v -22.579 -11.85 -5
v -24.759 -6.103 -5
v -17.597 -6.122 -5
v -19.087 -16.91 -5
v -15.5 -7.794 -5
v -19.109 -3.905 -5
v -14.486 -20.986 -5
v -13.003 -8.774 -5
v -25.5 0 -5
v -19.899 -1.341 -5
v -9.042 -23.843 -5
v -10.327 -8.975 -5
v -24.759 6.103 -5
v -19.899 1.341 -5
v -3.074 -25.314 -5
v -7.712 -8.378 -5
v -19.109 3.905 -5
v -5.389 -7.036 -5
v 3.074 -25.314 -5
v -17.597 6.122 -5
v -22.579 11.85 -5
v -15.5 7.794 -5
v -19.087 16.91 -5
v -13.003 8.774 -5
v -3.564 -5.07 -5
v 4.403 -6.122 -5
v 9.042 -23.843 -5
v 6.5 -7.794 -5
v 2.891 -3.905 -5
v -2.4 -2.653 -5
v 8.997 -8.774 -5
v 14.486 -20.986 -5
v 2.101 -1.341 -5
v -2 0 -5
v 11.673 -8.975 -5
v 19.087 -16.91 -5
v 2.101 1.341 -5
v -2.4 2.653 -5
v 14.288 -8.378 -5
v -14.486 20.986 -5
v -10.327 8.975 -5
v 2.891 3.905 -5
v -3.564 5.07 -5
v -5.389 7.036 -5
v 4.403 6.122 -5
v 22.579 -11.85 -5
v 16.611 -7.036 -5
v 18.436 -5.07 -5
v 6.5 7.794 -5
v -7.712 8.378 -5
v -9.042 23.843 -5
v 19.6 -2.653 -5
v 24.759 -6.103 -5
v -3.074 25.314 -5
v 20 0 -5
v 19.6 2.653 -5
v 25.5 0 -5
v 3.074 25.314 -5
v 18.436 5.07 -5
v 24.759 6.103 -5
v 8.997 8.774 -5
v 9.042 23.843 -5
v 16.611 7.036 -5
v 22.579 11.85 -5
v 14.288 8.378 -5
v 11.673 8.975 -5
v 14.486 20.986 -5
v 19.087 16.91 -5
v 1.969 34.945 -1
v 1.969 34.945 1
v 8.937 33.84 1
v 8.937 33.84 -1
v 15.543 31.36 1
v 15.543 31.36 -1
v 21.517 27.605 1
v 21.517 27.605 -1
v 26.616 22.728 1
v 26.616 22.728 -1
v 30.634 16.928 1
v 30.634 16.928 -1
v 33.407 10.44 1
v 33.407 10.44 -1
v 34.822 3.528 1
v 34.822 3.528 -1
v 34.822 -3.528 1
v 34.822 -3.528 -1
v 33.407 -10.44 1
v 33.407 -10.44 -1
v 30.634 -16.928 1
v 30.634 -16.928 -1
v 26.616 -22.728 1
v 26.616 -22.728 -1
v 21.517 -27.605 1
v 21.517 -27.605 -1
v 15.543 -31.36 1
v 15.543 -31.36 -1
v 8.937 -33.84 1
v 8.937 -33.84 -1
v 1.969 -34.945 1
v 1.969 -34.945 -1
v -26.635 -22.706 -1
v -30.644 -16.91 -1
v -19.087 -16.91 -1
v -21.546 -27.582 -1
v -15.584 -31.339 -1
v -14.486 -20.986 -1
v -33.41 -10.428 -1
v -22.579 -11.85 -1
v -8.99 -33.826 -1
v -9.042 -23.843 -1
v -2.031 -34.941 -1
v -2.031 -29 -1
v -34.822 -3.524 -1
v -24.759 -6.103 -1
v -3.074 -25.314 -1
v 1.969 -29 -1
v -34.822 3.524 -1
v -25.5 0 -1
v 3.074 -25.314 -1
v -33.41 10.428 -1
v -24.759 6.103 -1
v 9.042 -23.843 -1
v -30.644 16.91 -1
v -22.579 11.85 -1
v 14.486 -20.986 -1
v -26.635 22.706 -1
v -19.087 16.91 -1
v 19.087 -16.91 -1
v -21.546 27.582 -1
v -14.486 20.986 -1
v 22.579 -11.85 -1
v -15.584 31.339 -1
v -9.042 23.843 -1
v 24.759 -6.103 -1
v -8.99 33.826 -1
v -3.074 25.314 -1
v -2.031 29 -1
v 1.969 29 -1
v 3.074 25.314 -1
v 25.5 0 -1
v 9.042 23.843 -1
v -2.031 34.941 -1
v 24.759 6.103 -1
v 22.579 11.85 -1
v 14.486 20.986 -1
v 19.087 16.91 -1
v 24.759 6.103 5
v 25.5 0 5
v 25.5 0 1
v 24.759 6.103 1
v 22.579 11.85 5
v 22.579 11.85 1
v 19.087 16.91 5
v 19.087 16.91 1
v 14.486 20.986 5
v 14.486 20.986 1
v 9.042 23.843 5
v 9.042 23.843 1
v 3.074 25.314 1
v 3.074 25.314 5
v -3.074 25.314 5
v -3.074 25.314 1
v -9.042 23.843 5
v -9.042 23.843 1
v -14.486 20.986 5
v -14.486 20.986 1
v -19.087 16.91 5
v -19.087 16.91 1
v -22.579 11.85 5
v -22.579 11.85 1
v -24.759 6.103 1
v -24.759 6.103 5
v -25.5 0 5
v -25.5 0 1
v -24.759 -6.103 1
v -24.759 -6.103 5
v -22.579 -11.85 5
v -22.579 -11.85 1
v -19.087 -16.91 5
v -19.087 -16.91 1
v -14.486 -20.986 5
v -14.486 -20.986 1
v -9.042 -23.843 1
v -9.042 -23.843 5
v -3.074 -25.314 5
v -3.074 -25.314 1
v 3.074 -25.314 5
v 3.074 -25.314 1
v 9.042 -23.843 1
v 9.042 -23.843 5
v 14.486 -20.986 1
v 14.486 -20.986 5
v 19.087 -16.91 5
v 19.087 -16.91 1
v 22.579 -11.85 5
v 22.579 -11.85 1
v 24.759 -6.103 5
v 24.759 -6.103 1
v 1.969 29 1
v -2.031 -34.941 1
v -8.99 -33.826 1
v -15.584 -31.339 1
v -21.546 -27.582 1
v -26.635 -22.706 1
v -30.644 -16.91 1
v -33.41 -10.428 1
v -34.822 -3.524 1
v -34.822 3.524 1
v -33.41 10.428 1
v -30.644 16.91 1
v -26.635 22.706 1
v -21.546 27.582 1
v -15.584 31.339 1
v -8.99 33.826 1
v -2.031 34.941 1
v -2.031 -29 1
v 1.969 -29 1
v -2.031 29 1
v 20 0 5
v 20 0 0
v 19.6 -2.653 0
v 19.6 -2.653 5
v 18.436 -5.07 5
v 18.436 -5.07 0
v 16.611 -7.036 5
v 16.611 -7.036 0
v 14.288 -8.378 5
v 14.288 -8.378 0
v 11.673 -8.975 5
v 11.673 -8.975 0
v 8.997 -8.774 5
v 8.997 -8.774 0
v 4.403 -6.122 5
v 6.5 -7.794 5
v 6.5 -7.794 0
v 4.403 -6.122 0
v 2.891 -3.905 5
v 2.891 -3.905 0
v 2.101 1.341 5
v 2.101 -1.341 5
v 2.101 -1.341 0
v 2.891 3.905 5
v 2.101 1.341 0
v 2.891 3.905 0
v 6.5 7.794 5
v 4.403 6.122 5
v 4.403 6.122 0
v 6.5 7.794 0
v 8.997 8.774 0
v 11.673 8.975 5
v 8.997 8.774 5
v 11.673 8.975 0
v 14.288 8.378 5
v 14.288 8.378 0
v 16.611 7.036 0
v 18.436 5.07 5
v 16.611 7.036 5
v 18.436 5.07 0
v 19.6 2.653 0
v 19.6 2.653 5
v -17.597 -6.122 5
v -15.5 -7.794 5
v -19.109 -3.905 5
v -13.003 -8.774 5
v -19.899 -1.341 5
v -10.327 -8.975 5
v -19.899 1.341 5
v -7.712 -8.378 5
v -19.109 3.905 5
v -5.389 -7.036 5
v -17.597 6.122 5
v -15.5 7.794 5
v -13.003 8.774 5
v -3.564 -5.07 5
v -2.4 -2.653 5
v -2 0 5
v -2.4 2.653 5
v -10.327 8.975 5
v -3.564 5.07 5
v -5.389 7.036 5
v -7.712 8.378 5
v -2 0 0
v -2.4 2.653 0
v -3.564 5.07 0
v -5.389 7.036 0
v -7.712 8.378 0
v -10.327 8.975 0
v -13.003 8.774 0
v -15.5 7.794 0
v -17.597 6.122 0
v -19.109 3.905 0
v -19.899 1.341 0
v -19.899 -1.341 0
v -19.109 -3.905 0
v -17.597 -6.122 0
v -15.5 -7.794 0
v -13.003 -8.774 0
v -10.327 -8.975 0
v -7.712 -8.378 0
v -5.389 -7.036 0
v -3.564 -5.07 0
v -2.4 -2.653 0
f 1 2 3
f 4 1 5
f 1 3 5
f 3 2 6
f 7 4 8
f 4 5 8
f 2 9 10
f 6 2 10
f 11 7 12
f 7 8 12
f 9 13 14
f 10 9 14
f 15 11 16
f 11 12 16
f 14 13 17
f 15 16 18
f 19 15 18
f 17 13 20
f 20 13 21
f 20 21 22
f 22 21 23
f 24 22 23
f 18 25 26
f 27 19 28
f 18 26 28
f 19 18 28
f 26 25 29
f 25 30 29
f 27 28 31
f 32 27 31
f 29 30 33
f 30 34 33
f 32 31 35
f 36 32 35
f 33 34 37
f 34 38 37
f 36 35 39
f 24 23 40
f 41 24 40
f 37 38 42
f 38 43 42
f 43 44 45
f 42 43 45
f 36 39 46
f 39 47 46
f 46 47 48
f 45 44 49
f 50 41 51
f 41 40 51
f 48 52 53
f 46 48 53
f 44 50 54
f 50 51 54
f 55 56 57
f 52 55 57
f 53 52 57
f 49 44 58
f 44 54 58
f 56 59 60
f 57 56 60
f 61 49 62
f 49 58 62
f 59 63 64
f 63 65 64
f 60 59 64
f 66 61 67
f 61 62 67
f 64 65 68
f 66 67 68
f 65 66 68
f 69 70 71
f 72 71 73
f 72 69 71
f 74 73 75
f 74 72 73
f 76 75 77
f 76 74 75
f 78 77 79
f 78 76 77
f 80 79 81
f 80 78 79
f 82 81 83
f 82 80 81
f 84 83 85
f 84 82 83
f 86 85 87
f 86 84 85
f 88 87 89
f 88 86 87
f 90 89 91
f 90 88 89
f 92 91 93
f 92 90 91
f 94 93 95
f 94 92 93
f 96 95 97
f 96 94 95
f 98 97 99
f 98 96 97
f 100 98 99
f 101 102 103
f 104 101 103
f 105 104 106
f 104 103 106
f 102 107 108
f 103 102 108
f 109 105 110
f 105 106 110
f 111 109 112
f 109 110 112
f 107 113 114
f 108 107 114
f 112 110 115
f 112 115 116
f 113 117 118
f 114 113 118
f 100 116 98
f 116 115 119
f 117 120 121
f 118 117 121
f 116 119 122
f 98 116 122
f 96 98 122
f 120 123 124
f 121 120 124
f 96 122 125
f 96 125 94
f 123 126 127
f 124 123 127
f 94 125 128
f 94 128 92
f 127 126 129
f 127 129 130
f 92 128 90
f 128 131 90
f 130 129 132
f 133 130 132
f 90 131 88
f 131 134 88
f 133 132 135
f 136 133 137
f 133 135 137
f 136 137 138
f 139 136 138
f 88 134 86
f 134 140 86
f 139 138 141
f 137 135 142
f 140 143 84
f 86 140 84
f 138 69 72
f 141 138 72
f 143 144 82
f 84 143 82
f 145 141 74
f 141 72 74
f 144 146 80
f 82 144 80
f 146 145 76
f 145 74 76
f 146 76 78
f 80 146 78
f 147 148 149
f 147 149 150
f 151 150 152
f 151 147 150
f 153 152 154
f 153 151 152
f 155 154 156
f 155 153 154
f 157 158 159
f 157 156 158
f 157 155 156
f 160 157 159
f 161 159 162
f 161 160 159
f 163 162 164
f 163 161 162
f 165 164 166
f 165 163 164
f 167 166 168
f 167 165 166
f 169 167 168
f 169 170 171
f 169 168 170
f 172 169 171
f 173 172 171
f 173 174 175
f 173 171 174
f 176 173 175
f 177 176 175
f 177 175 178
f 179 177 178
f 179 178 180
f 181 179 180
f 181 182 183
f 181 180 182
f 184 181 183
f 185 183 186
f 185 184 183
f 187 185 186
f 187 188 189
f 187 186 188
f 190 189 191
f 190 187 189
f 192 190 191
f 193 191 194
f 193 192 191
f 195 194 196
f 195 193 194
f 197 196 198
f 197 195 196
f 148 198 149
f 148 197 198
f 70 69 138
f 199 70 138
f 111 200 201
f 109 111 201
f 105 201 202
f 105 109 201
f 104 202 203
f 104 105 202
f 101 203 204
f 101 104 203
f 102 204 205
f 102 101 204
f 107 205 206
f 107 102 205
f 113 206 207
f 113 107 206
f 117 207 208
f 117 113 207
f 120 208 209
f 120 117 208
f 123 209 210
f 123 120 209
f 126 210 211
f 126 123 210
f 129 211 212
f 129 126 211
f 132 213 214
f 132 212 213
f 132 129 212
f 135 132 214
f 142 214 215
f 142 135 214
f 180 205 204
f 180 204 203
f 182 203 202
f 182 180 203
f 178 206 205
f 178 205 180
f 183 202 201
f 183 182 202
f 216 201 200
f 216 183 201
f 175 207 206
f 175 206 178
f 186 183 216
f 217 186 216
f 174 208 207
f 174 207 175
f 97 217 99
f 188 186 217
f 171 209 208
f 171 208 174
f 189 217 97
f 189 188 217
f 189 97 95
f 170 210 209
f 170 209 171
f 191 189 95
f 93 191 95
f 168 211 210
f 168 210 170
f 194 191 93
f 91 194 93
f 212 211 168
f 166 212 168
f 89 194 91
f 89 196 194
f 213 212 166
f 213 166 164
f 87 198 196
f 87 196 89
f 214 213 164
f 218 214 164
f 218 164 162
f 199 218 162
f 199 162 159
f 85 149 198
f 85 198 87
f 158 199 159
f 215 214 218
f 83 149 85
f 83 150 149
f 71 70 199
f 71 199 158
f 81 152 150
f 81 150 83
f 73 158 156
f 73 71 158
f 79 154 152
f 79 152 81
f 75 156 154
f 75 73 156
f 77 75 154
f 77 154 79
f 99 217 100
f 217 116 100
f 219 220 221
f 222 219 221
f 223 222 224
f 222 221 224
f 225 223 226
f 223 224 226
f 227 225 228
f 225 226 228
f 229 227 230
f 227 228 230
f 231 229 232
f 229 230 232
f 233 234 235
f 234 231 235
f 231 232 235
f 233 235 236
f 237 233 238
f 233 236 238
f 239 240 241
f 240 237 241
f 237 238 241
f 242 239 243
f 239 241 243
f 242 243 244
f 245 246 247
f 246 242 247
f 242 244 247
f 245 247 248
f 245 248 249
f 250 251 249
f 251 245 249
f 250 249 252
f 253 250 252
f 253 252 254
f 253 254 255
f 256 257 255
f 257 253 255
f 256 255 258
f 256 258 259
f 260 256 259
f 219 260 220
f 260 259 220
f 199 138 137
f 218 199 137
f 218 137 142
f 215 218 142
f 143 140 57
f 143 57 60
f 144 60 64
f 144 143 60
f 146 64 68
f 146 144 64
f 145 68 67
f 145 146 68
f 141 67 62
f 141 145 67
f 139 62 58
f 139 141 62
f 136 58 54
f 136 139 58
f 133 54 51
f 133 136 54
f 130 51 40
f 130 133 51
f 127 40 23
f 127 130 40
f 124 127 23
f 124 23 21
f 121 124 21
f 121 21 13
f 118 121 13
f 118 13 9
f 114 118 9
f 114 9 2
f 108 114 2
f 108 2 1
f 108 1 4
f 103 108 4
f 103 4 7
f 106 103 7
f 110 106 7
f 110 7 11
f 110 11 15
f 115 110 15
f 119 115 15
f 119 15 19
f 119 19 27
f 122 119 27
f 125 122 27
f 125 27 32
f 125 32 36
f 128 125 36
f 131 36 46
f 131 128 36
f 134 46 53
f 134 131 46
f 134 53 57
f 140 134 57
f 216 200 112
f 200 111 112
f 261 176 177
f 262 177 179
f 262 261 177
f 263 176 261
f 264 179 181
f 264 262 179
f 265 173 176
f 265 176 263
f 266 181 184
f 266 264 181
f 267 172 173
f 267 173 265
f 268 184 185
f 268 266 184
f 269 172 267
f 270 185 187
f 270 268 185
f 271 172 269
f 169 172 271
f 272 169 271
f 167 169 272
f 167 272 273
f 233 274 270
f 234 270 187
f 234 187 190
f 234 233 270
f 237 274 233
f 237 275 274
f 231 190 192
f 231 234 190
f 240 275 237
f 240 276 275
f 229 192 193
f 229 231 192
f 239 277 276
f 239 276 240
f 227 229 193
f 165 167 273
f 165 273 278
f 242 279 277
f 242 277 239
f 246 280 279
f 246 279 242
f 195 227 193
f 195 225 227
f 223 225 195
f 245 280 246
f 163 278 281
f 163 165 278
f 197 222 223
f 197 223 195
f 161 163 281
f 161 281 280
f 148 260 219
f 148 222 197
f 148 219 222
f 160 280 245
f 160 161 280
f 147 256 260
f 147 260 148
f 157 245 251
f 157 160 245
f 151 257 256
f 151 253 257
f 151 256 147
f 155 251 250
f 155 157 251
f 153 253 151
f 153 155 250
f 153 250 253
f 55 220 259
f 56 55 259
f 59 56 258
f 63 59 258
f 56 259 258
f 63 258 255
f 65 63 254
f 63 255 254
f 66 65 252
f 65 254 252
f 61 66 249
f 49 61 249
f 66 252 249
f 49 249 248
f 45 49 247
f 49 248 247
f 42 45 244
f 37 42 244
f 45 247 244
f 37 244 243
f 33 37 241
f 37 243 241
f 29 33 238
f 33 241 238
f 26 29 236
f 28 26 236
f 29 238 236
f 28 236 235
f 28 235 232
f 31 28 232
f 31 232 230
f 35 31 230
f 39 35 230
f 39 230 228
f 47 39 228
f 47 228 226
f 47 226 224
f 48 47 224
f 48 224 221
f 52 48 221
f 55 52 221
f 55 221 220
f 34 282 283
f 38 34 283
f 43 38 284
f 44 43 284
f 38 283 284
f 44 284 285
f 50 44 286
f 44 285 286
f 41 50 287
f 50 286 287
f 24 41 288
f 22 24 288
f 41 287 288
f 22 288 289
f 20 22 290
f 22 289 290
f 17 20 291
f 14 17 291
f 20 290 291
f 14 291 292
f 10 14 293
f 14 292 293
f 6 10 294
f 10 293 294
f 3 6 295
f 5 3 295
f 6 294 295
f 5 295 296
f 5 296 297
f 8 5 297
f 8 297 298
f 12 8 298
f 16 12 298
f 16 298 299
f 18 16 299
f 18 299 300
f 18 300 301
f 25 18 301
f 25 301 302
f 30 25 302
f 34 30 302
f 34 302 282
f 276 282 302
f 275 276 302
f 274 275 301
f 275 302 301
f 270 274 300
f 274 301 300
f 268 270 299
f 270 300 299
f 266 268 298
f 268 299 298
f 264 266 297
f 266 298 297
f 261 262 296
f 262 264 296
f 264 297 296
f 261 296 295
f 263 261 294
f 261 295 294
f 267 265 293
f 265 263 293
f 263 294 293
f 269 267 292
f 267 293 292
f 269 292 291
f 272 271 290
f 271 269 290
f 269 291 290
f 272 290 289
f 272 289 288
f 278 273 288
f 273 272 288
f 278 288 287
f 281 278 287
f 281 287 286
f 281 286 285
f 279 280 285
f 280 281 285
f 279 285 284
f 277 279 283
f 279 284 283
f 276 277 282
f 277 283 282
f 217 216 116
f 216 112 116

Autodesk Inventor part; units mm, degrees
ref_plane "YZ Plane" through (0, 0, 0) normal (1, 0, 0) x (0, 1, 0)
ref_plane "XZ Plane" through (0, 0, 0) normal (0, 1, 0) x (-1, 0, 0)
ref_plane "XY Plane" through (0, 0, 0) normal (0, 0, 1) x (1, 0, 0)
sketch "Эскиз1" plane through (0, 0, 0) normal (0, 0, 1) x (1, 0, 0)
  circle A0 centre (0, 0) radius 35
  circle A1 centre (0, 0) radius 25.5
  circle A2 centre (11, 0) radius 9
  circle A3 centre (-11, 0) radius 9
  line L0 (-2.0313, 35) -> (1.9687, 35)
  line L1 (1.9687, 35) -> (1.9687, 29)
  line L2 (1.9687, 29) -> (-2.0313, 29)
  line L3 (-2.0313, 29) -> (-2.0313, 35)
  line L4 (-2.0313, -29) -> (1.9687, -29)
  line L5 (1.9687, -29) -> (1.9687, -35)
  line L6 (1.9687, -35) -> (-2.0313, -35)
  line L7 (-2.0313, -35) -> (-2.0313, -29)
  line L8 (-0.0313, 25.5) -> (-0.0313, -25.5)
  line L9 (-0.0313, -25.5) -> (-0.0313, -35)
  line L10 (-0.0313, 35) -> (-0.0313, 25.5)
  point P0 (-2.0313, 25.419)
  point P1 (-2.0313, -25.419)
  point P2 (1.9687, -25.4239)
  point P3 (1.9687, 25.4239)
  point P4 (1.9687, -34.9446)
  point P5 (1.9687, 34.9446)
  point P6 (-2.0313, 34.941)
  point P7 (-2.0313, -34.941)
  dimension "d0" = 70
  dimension "d1" = 51
  dimension "d2" = 18
  dimension "d3" = 18
  dimension "d4" = 11
  dimension "d5" = 11
  dimension "d6" = 40
  dimension "d7" = 4
  dimension "d8" = 4
  dimension "d9" = 6
  dimension "d10" = 6
  dimension "d11" = 2
  dimension "d12" = 2
  dimension "d17" = 0
  dimension "d18" = 0
extrude "Выдавливание1" add sketch "Эскиз1" along normal mid plane 10 contours L8 A1 | A1 L8
extrude "Выдавливание2" add sketch "Эскиз1" along normal mid plane 2 contours A0 L5 L4 L9 A1 L10 L2 L1 | L3 L2 L10 A1 L9 L4 L7 A0
equation "\"d0\" = dOuter"
equation "\"d1\" = dMount"
equation "\"d2\" = dHoles"
equation "\"d3\" = dHoles"
equation "\"d4\" = r2holes"
equation "\"d5\" = r2holes"
equation "\"d7\" = slotWidth"
equation "\"d8\" = slotWidth"
equation "\"d9\" = slotDepth"
equation "\"d10\" = slotDepth"
equation "\"d11\" = 0.5 * slotWidth"
equation "\"d12\" = 0.5 * slotWidth"
equation "\"dOuter\" = 70"
equation "\"dHoles\" = 18"
equation "\"hFlange\" = 4"
equation "\"hMount\" = 8"
equation "\"mountAngle\" = 60deg"
equation "\"dInternal\" = 44"
equation "\"dMount\" = 51"
equation "\"r2holes\" = 11"
equation "\"slotWidth\" = 4"
equation "\"slotDepth\" = 6"
properties part number "Spacer"
